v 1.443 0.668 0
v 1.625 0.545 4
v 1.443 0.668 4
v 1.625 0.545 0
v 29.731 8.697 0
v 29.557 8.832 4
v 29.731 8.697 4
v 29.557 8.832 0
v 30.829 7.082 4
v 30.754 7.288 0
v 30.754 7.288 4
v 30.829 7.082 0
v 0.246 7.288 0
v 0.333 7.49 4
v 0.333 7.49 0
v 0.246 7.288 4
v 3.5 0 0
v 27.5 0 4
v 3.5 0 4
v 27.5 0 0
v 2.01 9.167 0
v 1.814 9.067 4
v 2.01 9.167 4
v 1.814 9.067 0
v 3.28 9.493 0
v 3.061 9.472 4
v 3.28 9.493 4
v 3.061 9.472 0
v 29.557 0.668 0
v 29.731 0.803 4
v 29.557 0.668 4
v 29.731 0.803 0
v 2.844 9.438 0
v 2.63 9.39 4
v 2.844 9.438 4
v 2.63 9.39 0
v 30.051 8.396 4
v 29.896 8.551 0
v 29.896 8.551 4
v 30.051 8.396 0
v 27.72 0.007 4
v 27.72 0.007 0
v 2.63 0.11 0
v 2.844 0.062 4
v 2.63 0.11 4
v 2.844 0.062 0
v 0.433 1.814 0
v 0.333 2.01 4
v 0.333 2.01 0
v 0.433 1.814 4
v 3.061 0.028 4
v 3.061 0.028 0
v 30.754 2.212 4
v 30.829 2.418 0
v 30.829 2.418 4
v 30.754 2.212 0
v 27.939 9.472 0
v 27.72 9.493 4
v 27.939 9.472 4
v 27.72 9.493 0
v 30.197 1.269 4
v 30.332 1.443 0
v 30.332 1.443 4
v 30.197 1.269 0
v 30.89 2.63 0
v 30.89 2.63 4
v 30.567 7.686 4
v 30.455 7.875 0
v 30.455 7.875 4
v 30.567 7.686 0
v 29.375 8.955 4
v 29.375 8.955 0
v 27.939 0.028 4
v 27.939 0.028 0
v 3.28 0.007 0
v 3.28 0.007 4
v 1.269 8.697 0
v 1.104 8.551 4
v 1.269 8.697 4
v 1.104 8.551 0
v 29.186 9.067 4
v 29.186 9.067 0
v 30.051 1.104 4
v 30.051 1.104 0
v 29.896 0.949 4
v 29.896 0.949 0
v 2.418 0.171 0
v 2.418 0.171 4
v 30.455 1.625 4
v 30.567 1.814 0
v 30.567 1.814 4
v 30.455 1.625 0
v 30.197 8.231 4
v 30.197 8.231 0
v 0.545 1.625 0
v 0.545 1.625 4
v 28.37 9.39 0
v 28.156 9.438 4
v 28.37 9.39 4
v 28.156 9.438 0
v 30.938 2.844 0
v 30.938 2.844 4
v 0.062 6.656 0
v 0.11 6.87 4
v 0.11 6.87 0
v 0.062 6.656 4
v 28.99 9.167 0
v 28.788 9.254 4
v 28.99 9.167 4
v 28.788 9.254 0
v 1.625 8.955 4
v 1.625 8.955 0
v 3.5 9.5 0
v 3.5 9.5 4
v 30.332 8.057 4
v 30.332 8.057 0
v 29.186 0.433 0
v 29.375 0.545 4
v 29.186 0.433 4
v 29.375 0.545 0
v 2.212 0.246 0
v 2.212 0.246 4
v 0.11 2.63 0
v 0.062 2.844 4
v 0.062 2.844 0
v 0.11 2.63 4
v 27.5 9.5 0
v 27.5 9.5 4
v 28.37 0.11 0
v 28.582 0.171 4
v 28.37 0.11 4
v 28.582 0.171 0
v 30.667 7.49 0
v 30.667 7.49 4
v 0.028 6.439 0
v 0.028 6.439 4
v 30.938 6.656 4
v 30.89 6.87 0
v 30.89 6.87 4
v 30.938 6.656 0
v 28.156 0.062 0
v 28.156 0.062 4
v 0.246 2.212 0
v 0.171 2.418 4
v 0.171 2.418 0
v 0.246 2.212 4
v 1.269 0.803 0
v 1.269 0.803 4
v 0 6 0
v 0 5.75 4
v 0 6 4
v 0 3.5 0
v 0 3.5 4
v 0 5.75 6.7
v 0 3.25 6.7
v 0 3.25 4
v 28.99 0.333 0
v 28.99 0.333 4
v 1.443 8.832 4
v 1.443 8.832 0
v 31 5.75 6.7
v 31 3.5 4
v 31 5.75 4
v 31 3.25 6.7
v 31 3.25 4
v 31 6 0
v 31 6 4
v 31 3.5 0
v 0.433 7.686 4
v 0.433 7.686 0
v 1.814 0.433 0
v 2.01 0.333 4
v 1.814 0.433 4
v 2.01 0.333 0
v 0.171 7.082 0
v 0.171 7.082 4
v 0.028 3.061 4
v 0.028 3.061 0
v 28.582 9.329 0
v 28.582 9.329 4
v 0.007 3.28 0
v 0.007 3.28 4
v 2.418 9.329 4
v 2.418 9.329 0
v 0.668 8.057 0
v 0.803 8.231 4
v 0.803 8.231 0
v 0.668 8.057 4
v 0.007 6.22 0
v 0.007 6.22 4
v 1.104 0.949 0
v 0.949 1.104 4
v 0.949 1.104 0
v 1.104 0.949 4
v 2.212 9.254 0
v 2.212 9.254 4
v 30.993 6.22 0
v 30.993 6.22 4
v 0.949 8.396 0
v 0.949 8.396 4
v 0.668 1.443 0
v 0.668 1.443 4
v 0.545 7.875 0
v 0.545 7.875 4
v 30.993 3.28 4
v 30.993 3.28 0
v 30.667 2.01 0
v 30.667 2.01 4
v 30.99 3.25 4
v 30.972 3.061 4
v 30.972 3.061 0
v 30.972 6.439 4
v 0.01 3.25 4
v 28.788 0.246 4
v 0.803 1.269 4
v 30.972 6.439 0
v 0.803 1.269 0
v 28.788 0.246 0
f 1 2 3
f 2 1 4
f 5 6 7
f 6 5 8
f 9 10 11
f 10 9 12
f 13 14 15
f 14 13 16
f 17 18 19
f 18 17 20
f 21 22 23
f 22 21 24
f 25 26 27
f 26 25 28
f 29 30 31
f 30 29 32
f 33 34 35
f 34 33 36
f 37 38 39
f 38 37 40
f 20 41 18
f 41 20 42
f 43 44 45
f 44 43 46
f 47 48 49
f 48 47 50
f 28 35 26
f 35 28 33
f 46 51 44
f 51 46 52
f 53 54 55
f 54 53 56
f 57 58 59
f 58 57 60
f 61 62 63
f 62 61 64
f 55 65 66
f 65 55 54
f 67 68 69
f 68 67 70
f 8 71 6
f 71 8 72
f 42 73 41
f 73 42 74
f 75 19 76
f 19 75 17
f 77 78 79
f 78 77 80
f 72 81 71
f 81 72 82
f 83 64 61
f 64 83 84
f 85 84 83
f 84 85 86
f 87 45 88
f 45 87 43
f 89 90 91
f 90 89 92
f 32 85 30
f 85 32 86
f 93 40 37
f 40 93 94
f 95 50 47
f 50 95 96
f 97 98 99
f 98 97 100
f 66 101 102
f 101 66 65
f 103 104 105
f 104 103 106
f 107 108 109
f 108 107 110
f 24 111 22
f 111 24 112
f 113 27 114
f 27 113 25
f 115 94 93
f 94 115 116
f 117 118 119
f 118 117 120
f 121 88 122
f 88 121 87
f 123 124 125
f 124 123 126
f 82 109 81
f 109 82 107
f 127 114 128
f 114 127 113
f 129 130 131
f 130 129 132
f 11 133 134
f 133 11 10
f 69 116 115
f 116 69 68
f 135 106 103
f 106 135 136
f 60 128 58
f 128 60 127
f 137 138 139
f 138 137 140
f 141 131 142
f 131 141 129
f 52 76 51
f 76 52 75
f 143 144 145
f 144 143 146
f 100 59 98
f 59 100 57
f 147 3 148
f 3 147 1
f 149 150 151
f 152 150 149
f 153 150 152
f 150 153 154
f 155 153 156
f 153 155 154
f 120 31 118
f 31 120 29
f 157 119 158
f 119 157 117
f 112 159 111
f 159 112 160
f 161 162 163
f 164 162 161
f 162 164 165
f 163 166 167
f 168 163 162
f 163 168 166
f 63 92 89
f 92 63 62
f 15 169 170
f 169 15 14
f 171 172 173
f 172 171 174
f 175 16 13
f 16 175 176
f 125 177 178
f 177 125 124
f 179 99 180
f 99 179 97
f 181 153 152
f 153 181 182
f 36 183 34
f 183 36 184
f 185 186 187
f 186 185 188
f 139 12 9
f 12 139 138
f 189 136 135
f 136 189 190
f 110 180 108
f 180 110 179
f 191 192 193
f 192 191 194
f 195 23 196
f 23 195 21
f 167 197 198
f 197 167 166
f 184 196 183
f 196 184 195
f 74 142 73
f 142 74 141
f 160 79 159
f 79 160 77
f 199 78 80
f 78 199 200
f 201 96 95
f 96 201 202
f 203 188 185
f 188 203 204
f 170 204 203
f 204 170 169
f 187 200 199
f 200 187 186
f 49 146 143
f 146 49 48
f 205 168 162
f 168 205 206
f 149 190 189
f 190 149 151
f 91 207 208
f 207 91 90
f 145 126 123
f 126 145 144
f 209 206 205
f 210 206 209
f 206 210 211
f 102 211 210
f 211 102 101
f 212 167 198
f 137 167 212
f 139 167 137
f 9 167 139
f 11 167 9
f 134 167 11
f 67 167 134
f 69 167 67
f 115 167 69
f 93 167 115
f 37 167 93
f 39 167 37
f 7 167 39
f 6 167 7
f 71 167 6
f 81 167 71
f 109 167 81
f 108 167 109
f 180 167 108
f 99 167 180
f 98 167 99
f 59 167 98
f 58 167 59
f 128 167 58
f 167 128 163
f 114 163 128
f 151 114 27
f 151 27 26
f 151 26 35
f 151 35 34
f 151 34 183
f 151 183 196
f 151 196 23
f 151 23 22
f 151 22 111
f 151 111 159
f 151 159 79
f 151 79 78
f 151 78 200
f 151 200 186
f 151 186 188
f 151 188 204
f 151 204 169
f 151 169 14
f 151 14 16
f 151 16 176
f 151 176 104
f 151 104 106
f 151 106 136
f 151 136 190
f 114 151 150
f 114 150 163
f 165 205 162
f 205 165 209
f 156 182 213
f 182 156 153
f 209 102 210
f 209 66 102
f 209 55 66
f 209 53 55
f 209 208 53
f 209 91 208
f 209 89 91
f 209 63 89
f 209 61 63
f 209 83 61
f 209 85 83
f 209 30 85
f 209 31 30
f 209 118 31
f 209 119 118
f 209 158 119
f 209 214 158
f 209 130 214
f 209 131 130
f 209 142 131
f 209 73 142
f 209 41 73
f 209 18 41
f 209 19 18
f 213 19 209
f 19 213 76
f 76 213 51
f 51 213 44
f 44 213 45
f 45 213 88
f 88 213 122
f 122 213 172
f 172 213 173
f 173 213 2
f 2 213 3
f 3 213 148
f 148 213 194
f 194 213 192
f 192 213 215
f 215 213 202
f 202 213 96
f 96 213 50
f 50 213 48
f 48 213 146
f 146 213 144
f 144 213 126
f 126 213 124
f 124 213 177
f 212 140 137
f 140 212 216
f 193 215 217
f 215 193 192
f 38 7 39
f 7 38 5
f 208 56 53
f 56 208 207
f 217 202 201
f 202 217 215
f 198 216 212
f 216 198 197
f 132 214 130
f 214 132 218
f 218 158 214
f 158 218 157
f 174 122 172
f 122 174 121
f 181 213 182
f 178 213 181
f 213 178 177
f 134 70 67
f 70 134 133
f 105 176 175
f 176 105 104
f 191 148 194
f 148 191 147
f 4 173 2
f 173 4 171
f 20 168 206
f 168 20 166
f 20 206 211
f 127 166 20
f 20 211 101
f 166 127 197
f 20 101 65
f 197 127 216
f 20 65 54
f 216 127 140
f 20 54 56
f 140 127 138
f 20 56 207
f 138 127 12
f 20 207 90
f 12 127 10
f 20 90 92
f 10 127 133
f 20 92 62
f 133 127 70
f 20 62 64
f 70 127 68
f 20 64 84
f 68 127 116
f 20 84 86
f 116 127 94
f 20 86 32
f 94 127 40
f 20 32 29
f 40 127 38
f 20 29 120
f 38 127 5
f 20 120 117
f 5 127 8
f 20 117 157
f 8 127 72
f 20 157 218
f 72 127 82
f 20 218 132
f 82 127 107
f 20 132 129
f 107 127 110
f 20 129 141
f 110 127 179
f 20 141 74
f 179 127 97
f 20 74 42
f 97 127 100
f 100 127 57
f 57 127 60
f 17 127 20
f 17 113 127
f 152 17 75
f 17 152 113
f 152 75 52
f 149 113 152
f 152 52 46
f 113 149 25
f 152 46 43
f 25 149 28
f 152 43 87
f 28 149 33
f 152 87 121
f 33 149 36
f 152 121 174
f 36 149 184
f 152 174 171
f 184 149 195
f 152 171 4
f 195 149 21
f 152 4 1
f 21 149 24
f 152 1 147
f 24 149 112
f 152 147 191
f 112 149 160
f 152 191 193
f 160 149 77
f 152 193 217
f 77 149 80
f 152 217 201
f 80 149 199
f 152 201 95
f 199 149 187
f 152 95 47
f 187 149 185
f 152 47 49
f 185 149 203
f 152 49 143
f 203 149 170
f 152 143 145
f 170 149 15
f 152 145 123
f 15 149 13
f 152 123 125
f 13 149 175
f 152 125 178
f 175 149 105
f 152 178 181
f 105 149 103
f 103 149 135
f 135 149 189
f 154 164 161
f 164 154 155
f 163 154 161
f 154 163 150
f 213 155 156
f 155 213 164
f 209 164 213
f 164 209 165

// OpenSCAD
/**
 * The case-lock replaces the stock slide-in case locks of the Gainta G17081U
 * case. These come with rackmount ears, which we don't need and take up
 * unnecessary space.
 *
 * You will need 4 of these per case.
 */

$fn=100;

module rcube(size, radius) {
    hull() {
        translate([radius, radius]) cylinder(r = radius, h = size[2]);
        translate([size[0] - radius, radius]) cylinder(r = radius, h = size[2]);
        translate([size[0] - radius, size[1] - radius]) cylinder(r = radius, h = size[2]);
        translate([radius, size[1] - radius]) cylinder(r = radius, h = size[2]);
    }
}

rcube(size=[31,9.5,4], radius=3.5);

translate([0,3.25,4])
    cube(size=[31,2.5,2.7]);
